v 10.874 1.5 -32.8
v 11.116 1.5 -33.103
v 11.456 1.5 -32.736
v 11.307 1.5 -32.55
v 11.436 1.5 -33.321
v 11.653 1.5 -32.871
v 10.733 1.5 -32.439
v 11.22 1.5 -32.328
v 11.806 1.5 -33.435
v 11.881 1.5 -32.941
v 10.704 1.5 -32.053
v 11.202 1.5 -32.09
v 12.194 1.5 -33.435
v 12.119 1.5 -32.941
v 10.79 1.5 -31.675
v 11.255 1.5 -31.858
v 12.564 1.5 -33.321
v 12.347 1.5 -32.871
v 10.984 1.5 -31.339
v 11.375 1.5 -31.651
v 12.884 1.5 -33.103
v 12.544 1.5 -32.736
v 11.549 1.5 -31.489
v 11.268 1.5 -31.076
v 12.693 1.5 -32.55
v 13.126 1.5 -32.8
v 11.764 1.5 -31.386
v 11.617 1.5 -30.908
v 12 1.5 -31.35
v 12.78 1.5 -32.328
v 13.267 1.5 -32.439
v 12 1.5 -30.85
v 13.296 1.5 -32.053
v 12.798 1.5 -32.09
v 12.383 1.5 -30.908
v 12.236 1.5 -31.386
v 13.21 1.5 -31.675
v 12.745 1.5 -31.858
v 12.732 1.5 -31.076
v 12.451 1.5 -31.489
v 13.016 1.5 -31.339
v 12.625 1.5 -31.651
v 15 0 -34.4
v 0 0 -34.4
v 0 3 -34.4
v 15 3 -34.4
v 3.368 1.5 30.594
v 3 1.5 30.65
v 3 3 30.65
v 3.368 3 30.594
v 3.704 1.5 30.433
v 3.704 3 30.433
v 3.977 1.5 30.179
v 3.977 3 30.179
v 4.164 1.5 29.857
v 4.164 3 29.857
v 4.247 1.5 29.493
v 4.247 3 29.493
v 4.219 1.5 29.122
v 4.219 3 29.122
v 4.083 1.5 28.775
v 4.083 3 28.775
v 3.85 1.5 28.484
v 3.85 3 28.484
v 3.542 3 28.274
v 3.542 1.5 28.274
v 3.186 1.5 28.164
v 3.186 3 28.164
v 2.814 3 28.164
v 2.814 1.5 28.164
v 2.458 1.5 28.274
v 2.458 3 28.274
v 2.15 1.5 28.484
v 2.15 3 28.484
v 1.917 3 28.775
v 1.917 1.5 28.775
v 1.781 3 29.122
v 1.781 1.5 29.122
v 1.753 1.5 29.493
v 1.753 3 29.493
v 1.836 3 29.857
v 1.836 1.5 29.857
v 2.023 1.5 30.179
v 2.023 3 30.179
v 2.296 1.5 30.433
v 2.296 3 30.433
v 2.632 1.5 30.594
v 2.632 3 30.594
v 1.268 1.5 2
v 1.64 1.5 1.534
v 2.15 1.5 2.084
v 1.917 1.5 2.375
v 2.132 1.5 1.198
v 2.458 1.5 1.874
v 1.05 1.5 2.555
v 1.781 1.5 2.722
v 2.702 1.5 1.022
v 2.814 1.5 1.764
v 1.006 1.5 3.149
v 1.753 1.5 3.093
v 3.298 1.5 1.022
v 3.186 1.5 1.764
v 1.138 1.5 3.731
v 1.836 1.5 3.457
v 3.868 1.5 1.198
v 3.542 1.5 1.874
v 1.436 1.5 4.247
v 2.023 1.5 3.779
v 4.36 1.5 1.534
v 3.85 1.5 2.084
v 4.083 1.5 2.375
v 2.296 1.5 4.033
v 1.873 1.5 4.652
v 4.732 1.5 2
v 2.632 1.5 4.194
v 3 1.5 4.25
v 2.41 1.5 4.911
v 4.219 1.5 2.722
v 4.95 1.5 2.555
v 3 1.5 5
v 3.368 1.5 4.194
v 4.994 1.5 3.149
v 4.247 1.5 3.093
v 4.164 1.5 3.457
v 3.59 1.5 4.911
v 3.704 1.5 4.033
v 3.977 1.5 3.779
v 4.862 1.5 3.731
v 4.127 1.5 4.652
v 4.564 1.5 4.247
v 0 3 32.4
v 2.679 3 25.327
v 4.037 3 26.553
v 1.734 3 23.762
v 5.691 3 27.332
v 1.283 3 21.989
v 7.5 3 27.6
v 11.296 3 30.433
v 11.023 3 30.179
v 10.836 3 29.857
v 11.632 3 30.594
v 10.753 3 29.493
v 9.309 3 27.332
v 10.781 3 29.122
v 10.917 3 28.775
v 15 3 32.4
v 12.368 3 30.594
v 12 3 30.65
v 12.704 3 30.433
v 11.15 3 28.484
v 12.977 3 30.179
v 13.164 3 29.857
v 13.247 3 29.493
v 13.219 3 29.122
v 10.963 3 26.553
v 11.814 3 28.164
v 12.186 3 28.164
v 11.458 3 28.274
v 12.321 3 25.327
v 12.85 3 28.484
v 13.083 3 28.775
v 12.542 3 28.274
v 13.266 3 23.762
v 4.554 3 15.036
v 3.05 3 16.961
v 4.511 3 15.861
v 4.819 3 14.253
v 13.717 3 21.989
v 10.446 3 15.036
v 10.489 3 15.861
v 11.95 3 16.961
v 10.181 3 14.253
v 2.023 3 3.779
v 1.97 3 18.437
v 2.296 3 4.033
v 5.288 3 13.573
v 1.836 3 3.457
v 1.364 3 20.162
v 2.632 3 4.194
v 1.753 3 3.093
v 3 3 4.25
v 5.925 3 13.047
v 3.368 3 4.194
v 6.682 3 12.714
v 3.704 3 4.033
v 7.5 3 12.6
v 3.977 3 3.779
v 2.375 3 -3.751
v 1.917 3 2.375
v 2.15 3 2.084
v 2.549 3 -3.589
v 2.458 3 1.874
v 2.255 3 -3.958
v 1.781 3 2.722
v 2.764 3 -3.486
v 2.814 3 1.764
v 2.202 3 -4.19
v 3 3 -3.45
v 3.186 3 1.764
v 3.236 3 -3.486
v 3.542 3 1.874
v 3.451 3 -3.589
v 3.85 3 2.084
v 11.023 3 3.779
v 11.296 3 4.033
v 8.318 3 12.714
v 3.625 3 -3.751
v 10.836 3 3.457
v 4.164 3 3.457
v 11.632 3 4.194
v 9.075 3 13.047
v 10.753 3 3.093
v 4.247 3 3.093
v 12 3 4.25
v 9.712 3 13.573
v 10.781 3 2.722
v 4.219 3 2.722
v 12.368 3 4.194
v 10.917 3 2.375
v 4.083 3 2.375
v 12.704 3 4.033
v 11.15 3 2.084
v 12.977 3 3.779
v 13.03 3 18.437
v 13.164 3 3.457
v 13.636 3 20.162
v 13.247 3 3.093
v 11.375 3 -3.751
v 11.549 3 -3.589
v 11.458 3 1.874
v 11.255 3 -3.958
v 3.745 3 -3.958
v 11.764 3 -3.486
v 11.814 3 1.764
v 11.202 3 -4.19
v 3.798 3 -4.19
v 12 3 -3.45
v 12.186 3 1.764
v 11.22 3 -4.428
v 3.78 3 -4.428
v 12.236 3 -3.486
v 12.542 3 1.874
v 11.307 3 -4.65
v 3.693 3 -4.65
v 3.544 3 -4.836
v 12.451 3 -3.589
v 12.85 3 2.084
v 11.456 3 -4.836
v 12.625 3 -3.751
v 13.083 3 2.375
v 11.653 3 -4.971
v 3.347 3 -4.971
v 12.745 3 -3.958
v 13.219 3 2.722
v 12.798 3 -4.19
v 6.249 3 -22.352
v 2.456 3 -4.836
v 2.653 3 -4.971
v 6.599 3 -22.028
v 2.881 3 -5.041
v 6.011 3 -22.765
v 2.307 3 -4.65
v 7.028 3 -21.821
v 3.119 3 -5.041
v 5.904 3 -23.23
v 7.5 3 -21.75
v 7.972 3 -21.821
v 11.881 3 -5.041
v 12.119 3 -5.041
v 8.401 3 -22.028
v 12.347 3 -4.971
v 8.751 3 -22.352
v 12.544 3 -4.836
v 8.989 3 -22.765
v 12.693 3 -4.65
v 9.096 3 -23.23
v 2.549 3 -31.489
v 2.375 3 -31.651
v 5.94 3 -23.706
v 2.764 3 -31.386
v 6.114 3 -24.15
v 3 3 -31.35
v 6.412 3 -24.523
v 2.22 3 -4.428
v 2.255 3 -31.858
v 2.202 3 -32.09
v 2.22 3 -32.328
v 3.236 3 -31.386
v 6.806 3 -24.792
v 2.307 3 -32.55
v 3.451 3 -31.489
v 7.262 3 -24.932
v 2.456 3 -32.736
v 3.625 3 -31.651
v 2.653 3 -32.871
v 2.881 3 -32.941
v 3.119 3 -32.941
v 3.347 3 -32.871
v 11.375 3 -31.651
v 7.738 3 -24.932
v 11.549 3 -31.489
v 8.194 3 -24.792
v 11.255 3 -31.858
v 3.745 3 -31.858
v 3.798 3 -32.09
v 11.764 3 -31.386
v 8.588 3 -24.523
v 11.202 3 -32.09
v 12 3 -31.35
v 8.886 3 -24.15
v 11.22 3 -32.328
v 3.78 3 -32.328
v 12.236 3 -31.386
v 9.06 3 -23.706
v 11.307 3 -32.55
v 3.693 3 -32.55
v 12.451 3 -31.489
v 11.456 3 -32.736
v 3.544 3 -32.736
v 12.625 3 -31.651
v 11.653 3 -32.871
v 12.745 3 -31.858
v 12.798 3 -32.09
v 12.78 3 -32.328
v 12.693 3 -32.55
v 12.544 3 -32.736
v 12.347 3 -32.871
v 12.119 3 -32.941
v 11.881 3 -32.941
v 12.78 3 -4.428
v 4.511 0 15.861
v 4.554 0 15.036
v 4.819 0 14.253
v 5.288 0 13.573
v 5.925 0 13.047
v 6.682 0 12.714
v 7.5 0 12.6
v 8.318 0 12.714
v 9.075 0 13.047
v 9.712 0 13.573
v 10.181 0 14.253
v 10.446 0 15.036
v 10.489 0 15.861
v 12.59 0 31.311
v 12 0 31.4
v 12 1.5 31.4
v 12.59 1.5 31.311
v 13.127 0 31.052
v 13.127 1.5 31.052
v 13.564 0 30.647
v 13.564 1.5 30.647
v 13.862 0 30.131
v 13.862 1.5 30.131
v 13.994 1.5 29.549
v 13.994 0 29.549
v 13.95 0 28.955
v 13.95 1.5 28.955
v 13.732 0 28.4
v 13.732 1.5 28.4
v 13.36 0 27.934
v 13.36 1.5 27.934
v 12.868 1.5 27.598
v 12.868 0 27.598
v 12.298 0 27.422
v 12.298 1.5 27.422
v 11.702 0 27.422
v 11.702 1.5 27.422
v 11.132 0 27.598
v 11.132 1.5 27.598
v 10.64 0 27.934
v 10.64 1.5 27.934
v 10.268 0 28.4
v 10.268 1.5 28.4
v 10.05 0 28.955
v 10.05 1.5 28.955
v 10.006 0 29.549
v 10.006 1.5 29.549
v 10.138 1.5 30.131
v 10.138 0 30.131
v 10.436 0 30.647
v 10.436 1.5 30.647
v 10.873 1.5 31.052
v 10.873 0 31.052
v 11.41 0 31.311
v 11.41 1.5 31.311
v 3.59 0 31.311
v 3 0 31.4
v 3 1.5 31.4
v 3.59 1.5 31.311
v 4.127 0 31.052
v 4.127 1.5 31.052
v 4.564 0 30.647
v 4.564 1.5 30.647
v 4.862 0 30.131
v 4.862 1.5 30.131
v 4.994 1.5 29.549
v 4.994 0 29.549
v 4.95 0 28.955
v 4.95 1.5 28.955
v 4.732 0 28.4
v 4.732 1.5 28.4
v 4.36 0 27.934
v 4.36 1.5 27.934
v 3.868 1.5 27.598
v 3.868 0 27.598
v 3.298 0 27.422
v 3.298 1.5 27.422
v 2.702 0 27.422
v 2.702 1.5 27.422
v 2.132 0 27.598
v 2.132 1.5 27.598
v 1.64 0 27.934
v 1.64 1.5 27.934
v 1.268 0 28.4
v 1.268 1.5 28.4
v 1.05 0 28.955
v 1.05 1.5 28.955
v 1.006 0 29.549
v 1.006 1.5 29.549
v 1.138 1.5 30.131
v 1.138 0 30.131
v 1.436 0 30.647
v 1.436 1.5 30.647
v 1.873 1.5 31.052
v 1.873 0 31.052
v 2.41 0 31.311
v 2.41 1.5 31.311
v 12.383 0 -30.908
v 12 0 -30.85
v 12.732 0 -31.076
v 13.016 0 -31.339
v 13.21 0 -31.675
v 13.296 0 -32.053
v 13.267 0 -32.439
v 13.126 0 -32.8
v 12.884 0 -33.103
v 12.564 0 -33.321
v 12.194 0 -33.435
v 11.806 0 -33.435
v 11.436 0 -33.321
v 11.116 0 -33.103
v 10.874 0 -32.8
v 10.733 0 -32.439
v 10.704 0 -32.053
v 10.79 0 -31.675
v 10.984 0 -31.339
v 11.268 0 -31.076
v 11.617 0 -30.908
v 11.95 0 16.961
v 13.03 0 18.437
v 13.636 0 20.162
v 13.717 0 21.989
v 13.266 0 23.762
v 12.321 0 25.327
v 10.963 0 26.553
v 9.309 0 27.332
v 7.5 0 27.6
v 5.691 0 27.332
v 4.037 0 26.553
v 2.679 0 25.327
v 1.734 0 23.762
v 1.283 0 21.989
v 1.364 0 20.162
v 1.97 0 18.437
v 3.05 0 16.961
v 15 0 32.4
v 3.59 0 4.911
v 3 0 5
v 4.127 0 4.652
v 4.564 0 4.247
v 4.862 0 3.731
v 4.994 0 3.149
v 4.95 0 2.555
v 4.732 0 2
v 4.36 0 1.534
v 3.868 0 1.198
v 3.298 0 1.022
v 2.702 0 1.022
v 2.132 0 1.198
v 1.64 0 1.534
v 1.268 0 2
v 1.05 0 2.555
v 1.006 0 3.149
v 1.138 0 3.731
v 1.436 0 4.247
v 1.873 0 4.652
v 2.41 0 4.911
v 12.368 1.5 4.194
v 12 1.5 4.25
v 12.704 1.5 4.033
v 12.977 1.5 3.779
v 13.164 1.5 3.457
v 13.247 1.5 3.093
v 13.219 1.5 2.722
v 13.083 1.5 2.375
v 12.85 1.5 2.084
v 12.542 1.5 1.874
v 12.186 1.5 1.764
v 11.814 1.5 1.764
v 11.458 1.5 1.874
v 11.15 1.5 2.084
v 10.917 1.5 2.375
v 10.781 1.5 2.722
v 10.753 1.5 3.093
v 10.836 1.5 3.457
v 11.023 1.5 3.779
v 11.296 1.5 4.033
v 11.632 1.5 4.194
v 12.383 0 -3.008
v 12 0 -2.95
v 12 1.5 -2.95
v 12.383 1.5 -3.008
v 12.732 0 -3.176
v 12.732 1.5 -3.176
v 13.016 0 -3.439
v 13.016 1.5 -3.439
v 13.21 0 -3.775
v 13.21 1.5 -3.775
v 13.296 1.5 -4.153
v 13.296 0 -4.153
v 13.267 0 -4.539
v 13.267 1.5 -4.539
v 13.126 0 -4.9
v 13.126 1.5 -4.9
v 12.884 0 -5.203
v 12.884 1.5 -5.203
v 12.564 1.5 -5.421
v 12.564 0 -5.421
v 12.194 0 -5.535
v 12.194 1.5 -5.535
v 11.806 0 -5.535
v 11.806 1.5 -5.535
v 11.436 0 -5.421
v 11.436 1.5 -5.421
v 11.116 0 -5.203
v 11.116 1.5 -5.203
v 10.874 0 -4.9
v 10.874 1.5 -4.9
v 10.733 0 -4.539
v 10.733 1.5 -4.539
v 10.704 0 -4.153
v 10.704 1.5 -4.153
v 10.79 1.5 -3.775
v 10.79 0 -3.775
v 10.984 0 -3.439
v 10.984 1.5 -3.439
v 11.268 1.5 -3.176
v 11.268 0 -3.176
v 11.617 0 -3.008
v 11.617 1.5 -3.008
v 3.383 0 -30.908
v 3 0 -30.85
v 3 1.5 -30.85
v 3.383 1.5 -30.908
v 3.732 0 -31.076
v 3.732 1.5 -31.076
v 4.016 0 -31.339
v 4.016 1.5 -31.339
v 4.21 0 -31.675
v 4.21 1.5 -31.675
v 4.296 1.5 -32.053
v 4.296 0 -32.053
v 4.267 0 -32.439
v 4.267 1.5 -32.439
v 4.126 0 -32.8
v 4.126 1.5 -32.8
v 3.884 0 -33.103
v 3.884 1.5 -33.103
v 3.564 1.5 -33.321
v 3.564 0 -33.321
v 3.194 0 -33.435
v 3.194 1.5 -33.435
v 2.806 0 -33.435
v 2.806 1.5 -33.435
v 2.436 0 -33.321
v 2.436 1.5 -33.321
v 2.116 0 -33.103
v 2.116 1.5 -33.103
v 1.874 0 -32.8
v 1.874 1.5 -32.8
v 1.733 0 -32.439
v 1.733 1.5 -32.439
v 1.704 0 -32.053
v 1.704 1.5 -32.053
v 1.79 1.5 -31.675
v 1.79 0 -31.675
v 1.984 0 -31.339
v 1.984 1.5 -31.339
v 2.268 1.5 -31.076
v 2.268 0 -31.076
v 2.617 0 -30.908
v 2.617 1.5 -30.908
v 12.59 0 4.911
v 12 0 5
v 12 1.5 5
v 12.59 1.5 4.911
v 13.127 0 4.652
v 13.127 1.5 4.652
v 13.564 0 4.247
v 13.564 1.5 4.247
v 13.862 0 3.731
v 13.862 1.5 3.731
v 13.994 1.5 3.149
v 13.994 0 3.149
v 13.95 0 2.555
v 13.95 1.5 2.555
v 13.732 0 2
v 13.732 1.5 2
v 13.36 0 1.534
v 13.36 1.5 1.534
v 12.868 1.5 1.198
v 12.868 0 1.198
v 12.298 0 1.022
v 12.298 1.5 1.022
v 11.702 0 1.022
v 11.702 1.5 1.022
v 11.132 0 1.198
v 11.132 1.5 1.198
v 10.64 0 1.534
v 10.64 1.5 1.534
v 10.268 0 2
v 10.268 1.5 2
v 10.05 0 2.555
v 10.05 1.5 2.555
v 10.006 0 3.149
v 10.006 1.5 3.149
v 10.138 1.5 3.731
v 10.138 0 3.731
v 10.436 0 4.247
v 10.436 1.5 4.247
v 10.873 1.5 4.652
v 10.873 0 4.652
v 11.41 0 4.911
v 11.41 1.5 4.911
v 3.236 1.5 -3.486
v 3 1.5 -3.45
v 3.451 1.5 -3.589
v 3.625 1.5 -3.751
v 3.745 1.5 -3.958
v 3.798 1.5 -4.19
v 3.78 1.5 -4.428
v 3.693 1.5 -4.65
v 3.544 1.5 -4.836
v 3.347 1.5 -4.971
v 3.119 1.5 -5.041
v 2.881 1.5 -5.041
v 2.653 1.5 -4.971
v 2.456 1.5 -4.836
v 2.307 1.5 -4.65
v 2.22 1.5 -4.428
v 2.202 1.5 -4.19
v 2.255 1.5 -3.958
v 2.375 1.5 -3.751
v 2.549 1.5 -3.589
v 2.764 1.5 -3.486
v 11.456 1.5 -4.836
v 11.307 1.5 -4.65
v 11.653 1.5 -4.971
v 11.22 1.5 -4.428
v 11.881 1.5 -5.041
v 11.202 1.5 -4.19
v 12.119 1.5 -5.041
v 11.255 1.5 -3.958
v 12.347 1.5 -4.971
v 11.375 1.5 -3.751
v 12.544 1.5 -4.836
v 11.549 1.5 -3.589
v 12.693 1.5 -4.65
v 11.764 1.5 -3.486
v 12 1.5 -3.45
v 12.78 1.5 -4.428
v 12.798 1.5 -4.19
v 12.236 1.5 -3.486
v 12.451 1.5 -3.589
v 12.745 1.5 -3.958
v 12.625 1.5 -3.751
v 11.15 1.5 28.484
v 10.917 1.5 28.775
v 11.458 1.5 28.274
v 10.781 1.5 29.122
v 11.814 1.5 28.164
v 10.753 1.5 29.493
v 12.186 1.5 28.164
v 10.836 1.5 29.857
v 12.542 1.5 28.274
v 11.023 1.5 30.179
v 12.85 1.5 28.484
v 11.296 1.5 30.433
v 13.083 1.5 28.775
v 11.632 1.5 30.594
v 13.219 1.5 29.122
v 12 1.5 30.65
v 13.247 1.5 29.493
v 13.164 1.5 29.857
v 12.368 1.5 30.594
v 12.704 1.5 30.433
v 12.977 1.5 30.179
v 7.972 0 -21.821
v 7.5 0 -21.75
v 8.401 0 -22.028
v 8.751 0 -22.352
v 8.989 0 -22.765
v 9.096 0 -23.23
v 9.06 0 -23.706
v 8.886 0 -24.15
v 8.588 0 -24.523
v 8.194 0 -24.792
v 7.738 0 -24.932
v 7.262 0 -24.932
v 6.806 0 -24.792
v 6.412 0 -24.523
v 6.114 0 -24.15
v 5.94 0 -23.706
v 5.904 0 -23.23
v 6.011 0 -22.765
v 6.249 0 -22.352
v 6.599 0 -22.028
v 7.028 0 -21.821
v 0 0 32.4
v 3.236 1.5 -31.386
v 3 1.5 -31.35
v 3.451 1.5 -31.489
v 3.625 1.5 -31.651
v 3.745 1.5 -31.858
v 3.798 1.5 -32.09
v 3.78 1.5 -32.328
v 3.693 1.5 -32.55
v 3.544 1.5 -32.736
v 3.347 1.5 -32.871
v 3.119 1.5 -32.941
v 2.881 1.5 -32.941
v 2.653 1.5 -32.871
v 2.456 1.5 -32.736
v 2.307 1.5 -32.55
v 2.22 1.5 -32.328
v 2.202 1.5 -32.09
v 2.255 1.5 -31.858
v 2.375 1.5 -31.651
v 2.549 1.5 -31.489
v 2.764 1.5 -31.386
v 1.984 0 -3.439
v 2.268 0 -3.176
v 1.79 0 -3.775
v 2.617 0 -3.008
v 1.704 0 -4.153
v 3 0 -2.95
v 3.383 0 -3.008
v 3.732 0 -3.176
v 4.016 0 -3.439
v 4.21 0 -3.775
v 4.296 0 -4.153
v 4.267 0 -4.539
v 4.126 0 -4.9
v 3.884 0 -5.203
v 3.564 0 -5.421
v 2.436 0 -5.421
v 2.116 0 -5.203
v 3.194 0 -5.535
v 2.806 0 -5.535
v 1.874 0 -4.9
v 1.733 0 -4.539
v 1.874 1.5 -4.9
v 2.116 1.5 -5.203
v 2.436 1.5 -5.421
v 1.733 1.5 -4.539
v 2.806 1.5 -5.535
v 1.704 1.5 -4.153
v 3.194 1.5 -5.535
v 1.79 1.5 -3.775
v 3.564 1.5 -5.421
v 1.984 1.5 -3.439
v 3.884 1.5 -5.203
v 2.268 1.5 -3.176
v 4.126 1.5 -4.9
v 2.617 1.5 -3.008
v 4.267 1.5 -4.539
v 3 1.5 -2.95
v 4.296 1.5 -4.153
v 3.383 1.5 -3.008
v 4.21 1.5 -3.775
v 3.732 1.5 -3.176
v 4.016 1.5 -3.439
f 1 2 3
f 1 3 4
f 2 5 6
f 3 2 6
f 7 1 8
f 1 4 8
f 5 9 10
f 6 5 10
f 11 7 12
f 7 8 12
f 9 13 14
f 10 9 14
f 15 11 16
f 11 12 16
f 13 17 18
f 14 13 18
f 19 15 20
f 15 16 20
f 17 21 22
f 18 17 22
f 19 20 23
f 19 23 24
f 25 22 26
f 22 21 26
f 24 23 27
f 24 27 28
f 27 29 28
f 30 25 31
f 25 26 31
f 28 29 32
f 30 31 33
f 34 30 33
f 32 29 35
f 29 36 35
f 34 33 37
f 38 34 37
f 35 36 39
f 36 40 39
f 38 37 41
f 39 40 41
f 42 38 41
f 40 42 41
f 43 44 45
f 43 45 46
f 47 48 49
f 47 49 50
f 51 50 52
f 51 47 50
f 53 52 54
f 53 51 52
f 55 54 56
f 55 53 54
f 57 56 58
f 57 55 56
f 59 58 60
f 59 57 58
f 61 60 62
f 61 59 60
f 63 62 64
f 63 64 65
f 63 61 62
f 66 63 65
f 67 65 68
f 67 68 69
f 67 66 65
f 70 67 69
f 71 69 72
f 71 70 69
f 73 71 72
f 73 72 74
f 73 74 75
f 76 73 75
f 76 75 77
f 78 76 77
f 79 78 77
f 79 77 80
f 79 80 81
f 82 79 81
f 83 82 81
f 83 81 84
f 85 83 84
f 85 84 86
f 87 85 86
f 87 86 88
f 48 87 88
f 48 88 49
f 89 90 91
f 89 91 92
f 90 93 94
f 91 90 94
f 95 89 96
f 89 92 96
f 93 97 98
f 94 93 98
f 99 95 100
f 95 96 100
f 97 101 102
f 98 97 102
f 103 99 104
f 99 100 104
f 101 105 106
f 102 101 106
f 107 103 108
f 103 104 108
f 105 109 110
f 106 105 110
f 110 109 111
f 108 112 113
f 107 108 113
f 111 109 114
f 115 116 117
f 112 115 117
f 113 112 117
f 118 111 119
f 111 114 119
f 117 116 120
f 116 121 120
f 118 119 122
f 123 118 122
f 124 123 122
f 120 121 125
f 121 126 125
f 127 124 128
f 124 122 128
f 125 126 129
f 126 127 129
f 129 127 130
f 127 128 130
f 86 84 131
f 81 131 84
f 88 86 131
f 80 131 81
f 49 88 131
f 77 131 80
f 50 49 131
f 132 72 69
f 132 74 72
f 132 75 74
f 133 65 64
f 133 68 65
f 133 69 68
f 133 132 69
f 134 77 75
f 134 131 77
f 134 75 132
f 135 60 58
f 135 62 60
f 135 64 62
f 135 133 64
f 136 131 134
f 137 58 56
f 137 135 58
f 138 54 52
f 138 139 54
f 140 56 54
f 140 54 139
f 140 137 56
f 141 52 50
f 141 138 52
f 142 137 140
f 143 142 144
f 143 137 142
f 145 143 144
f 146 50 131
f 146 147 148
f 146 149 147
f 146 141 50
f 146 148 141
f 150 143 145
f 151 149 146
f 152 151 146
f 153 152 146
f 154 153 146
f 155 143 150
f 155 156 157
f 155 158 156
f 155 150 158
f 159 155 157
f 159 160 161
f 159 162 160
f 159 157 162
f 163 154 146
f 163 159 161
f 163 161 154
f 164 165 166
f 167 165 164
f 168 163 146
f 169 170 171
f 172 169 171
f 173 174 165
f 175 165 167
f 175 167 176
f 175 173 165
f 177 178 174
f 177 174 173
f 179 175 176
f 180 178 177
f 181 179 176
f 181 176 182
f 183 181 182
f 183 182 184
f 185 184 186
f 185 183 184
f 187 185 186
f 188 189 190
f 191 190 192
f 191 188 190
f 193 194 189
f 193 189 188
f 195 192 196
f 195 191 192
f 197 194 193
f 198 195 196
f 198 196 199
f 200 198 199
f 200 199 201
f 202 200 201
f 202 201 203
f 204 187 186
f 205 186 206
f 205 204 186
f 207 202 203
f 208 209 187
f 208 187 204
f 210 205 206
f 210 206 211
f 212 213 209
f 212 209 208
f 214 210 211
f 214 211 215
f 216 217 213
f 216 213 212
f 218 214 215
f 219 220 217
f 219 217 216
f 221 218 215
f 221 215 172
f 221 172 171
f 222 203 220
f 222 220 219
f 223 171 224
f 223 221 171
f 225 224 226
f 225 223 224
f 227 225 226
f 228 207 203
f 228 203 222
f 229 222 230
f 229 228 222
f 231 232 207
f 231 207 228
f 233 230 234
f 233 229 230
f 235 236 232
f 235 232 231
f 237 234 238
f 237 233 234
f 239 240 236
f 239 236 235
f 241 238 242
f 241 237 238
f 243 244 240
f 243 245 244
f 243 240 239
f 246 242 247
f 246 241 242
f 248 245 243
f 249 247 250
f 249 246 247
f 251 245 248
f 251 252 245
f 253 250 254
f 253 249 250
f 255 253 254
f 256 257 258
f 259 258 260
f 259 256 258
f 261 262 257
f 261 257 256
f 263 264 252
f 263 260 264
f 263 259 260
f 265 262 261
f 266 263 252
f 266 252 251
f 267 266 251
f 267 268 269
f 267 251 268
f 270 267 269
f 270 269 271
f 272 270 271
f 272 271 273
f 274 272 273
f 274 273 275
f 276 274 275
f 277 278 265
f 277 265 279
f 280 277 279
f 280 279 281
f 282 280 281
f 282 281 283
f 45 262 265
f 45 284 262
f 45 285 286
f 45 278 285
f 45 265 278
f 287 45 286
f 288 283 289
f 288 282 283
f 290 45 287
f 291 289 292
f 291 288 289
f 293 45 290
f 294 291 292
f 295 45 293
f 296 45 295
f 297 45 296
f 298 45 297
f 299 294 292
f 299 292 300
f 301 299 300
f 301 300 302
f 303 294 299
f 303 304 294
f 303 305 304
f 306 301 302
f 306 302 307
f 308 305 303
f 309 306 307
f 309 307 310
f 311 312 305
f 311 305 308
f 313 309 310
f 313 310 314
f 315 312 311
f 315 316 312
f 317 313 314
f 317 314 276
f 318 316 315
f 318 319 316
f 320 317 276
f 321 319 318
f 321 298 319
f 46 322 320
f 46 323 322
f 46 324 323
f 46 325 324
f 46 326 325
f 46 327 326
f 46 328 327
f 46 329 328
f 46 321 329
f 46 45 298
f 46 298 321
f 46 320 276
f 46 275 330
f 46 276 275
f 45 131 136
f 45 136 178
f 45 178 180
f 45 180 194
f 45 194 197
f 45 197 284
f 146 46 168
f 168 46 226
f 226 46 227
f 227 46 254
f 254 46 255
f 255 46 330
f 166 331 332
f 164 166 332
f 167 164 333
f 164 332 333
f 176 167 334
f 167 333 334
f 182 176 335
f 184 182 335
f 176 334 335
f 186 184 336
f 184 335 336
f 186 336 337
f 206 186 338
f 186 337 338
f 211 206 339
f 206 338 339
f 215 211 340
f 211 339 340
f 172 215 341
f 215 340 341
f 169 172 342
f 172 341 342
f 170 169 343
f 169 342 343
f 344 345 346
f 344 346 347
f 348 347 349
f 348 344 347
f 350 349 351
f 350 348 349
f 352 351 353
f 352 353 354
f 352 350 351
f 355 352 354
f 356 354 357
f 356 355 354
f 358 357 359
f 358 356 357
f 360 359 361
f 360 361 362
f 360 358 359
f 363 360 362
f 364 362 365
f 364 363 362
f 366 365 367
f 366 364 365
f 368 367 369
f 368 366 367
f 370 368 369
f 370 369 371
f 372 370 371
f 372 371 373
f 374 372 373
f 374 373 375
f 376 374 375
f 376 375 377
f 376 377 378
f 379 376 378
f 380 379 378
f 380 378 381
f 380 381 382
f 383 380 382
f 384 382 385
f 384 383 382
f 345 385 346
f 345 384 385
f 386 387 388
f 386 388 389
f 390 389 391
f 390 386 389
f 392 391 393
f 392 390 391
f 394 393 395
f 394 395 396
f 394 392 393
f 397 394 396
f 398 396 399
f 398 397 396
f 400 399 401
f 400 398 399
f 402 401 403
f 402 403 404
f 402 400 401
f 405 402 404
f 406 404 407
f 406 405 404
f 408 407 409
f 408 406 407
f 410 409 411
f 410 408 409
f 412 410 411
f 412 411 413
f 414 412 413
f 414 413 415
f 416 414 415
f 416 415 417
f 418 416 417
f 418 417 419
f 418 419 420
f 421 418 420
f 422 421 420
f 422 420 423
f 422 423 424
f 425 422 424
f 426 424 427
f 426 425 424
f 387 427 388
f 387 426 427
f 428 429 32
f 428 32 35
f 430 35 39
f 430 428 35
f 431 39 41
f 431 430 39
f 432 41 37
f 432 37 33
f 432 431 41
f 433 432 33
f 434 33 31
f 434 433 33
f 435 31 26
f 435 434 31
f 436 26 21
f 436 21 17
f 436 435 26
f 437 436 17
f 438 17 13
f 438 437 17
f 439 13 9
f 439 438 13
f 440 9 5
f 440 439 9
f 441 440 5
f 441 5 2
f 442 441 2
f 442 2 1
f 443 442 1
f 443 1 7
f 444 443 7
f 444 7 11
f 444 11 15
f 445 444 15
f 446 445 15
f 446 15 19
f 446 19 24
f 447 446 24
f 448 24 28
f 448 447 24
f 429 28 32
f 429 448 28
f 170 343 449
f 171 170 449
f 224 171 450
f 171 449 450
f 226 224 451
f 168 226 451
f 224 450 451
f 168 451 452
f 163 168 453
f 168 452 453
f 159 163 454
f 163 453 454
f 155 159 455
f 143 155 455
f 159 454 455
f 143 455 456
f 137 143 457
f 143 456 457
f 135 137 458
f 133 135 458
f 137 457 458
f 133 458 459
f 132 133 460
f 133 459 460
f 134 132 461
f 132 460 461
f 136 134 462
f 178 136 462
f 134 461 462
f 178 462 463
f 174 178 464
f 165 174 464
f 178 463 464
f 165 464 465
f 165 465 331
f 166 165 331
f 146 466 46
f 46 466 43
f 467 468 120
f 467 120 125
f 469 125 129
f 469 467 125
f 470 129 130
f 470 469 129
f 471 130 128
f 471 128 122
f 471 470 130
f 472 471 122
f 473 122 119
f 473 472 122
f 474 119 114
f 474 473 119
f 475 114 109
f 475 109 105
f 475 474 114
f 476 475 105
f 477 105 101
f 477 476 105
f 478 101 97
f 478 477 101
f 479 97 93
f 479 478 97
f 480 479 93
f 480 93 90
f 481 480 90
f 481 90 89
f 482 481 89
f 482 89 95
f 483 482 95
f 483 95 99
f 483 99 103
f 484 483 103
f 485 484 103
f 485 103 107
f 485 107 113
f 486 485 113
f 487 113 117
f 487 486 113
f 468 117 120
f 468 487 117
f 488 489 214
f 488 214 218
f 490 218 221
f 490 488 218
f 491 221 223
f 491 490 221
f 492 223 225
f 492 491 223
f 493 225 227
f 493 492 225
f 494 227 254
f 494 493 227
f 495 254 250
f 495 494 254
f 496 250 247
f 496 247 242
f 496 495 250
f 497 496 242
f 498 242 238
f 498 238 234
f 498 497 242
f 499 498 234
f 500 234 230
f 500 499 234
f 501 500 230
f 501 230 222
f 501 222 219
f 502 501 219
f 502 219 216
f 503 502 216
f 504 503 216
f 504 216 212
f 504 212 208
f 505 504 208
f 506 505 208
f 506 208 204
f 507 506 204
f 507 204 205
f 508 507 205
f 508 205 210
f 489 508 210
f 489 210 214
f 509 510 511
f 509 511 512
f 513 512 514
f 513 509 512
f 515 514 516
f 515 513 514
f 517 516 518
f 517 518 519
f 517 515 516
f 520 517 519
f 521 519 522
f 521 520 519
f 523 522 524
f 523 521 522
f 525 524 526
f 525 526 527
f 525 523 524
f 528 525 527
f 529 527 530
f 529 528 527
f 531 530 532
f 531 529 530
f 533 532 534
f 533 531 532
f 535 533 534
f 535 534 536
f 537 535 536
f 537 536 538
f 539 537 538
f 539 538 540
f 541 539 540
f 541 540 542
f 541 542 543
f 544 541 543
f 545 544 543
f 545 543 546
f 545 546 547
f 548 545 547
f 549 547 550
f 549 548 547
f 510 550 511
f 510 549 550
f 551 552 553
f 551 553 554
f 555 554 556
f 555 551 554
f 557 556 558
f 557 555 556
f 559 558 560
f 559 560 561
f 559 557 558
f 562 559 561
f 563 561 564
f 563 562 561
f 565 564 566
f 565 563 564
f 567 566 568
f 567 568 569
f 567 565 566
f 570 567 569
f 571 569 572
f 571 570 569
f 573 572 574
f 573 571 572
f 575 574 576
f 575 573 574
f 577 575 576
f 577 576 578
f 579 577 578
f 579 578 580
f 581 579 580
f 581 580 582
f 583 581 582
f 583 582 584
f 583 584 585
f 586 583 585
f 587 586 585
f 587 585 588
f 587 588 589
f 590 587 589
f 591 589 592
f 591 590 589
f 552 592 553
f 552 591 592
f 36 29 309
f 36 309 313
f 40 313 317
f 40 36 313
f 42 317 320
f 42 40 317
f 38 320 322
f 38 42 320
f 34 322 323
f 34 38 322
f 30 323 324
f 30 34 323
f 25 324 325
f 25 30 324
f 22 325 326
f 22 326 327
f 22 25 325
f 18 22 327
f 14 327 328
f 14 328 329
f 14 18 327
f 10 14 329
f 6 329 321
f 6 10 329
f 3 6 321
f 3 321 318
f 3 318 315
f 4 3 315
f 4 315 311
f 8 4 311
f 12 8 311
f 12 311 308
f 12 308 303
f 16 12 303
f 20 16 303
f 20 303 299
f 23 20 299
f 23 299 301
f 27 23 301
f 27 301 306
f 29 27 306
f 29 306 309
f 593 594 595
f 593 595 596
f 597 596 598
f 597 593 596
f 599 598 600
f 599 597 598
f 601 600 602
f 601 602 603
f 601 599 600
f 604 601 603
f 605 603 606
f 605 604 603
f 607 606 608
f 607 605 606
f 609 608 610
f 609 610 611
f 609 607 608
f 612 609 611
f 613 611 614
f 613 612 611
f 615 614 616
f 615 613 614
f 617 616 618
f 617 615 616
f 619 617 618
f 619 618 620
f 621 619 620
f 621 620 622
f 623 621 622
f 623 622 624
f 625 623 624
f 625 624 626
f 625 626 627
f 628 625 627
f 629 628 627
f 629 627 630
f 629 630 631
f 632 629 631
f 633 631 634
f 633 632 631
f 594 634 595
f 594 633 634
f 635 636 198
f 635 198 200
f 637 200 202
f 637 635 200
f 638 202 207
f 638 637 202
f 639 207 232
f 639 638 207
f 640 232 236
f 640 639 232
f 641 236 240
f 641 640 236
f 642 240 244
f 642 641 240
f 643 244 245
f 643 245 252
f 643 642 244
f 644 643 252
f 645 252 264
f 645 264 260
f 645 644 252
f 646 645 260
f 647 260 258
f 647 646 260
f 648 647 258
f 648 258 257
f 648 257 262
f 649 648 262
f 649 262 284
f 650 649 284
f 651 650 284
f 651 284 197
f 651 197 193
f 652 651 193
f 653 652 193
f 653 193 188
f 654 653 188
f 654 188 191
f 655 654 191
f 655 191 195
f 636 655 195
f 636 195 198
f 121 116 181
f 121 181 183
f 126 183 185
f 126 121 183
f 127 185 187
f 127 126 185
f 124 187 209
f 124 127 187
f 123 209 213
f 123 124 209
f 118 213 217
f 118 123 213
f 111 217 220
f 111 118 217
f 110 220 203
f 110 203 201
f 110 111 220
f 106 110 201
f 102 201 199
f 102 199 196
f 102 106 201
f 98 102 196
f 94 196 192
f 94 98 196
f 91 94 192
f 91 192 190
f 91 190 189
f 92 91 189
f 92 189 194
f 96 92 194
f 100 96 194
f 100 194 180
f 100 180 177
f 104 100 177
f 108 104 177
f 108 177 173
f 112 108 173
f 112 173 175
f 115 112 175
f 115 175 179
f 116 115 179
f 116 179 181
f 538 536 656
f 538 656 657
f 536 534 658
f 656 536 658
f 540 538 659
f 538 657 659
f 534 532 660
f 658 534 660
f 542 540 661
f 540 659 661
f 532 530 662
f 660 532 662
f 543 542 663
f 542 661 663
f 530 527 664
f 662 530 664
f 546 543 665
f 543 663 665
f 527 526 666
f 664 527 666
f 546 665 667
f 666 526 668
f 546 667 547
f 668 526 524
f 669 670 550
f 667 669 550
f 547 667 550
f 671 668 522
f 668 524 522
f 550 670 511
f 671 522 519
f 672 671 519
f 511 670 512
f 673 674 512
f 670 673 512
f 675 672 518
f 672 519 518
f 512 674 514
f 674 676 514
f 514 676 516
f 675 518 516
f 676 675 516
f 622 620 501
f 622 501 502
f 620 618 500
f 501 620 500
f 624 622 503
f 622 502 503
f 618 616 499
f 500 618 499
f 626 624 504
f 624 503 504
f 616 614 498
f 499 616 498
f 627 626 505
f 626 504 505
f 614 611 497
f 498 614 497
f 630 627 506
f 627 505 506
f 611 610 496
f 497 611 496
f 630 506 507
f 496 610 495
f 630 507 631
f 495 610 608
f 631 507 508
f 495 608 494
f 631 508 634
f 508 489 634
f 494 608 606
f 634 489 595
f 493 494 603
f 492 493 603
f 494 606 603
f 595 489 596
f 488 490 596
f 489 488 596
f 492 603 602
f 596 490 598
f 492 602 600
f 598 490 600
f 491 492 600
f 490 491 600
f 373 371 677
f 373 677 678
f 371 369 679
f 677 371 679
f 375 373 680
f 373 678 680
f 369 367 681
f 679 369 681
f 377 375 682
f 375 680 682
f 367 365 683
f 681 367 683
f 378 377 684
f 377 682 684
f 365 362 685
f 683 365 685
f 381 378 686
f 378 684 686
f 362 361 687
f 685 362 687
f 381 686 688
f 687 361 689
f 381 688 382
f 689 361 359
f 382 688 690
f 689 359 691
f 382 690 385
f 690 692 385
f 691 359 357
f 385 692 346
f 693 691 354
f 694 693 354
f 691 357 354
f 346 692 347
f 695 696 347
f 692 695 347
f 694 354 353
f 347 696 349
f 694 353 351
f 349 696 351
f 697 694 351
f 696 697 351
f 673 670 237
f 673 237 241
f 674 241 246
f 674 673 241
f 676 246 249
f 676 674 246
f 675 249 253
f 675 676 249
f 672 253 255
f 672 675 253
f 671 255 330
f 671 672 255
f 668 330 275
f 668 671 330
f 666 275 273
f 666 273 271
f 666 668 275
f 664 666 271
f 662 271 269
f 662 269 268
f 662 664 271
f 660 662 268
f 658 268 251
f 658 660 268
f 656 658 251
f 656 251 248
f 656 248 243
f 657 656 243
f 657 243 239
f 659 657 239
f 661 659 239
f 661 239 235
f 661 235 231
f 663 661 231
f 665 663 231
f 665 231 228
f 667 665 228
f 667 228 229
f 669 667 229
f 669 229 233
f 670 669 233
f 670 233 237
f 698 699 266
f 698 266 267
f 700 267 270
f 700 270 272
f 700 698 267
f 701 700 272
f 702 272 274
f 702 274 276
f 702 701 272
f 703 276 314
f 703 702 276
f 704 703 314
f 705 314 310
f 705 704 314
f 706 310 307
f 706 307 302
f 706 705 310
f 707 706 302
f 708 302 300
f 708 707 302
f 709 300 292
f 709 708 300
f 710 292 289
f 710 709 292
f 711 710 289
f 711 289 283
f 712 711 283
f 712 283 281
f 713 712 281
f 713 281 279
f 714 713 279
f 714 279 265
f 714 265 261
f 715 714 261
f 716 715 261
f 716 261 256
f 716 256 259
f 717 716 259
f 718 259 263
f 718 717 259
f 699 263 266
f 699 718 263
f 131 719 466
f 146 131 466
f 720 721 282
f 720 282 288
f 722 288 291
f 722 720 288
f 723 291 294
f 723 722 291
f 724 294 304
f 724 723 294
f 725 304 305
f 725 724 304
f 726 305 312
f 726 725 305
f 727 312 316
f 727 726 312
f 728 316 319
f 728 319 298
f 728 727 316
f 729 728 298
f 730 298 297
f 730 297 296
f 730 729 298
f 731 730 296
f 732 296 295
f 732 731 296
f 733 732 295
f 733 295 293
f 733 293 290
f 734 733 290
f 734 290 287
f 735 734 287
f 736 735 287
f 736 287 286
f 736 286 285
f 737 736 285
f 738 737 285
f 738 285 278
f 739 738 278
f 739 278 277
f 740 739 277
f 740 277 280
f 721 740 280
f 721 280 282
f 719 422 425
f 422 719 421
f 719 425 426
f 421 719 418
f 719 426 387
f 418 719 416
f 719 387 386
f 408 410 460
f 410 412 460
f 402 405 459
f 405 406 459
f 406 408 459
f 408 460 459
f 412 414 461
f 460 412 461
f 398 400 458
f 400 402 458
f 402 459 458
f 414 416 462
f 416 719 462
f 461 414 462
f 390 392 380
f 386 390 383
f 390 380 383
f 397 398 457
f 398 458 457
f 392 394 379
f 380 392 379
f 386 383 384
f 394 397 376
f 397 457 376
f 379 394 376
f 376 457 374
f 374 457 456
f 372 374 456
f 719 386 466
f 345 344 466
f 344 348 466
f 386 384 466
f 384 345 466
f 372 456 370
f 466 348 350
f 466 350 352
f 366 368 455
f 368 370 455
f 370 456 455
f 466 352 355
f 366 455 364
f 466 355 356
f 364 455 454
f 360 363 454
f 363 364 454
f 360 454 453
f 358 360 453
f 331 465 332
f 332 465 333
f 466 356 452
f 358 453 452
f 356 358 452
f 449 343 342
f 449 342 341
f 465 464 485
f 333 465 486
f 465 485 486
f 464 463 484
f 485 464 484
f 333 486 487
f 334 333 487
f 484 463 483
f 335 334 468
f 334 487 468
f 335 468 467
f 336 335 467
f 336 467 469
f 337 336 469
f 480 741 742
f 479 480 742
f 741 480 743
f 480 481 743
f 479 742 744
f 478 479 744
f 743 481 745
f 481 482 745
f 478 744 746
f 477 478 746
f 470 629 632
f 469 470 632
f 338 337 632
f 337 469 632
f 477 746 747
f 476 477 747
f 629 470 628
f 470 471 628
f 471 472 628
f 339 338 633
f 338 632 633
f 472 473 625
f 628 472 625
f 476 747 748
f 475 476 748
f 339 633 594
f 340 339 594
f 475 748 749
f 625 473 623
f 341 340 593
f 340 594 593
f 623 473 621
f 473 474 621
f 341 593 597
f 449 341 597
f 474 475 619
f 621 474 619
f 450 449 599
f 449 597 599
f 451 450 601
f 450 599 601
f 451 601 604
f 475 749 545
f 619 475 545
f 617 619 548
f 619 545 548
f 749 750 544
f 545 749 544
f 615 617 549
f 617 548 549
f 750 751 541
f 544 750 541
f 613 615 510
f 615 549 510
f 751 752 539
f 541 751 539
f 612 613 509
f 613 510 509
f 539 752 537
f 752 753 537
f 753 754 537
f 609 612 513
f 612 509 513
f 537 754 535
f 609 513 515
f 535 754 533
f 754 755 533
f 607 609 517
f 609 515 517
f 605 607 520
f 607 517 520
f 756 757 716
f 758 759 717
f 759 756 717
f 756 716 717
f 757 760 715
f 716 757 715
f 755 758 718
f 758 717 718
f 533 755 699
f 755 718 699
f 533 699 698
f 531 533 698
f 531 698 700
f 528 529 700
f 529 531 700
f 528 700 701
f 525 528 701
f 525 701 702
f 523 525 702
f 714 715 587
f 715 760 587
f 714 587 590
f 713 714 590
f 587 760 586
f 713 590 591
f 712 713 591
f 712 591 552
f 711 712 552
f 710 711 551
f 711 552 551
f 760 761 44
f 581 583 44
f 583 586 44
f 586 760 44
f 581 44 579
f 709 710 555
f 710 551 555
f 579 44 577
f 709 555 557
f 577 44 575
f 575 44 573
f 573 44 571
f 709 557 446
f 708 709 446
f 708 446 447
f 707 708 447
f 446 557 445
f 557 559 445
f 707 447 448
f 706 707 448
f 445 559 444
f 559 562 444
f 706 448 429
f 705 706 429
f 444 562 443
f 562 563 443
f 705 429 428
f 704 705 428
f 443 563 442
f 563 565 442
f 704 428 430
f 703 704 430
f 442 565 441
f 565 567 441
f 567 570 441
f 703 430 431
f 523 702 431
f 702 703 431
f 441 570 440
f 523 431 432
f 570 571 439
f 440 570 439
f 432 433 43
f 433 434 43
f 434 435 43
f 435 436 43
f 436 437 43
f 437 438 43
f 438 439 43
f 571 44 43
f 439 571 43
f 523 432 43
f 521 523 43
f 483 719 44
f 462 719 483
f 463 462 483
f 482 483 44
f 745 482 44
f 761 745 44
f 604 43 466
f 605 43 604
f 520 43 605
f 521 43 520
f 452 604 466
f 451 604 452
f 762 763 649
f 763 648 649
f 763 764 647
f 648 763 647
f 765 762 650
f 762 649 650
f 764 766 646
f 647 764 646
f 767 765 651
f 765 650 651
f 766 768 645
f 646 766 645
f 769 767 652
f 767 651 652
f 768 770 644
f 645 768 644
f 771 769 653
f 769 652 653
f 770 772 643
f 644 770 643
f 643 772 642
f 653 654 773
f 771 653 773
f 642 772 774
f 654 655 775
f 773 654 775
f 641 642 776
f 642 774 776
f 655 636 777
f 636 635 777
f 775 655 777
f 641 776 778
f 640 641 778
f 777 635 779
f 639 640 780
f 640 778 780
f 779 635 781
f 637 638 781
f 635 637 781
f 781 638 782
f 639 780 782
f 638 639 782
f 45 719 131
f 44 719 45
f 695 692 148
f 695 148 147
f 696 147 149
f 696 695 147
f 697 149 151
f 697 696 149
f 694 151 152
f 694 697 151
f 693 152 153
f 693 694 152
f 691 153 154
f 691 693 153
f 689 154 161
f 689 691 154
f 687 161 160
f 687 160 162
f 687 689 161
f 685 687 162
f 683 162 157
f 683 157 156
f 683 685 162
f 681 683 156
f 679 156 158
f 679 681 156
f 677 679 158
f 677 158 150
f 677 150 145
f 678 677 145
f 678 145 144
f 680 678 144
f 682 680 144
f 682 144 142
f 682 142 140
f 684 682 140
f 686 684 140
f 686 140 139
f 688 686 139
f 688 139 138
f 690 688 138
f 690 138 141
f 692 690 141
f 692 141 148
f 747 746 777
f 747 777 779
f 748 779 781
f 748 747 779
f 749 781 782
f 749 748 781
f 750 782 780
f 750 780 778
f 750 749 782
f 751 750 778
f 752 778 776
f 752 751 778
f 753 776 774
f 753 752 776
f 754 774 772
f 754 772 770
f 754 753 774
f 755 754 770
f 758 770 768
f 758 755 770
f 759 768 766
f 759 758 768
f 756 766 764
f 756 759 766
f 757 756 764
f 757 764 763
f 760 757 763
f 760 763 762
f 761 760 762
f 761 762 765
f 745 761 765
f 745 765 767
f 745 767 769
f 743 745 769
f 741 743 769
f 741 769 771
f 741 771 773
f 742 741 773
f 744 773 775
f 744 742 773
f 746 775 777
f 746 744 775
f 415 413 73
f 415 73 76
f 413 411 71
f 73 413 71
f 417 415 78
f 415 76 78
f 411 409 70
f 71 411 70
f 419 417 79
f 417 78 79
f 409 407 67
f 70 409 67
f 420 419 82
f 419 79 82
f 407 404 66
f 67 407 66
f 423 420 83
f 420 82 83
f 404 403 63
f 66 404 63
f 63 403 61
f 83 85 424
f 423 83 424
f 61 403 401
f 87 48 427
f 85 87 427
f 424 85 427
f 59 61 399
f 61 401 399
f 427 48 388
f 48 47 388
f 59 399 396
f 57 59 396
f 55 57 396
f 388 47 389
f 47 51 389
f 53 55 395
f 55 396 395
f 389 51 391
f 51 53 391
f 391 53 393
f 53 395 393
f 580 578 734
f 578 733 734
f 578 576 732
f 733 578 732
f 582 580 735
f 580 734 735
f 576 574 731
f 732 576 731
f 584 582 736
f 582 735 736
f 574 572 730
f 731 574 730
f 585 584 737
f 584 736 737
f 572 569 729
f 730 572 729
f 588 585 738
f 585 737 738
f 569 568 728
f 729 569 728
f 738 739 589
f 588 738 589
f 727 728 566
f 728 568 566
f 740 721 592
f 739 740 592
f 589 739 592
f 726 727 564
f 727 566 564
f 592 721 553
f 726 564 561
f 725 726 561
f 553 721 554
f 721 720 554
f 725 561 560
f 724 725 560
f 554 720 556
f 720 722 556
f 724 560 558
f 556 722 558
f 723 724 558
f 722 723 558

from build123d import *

# Parameters (mm, degrees)
SKETCH_1_W          = 15
SKETCH_1_H          = 66.8
SKETCH_1_R          = 1.6
SKETCH_1_R_2        = 0.8
SKETCH_1_R_3        = 1.25
EXTRUDE_1_DEPTH     = 3
SKETCH_1_5_R        = 2
SKETCH_1_5_R_2      = 1.3
CUT_EXTRUDE_3_DEPTH = 1.5


with BuildPart() as part:
    # 草图1 → 凸台-拉伸1 (new body)
    with BuildSketch(Plane(origin=(0, 0, 0), x_dir=(1, 0, 0), z_dir=(0, 1, 0))):
        with Locations((7.5, 1)):
            Rectangle(SKETCH_1_W, SKETCH_1_H)
        with Locations((7.5, 23.35)):
            Circle(SKETCH_1_R, mode=Mode.SUBTRACT)
        with BuildLine():
            ThreePointArc((10.488636323, -15.860869565), (7.5, -27.6), (4.511363677, -15.860869565))
            ThreePointArc((4.511363677, -15.860869565), (7.5, -12.6), (10.488636323, -15.860869565))
        make_face(mode=Mode.SUBTRACT)
        with Locations((12, 32.15)):
            Circle(SKETCH_1_R_2, mode=Mode.SUBTRACT)
        with Locations((3, 4.25)):
            Circle(SKETCH_1_R_2, mode=Mode.SUBTRACT)
        with Locations((3, 32.15)):
            Circle(SKETCH_1_R_2, mode=Mode.SUBTRACT)
        with Locations((12, 4.25)):
            Circle(SKETCH_1_R_2, mode=Mode.SUBTRACT)
        with Locations((12, -3)):
            Circle(SKETCH_1_R_3, mode=Mode.SUBTRACT)
        with Locations((3, -29.4)):
            Circle(SKETCH_1_R_3, mode=Mode.SUBTRACT)
        with Locations((3, -3)):
            Circle(SKETCH_1_R_3, mode=Mode.SUBTRACT)
        with Locations((12, -29.4)):
            Circle(SKETCH_1_R_3, mode=Mode.SUBTRACT)
    extrude(amount=EXTRUDE_1_DEPTH)

    # 草图1<5> → 切除-拉伸3 (cut)
    with BuildSketch(Plane(origin=(0, 0, 0), x_dir=(1, 0, 0), z_dir=(0, 1, 0))):
        with Locations((3, -3)):
            Circle(SKETCH_1_5_R)
        with Locations((12, -3)):
            Circle(SKETCH_1_5_R)
        with Locations((3, -29.4)):
            Circle(SKETCH_1_5_R)
        with Locations((12, -29.4)):
            Circle(SKETCH_1_5_R)
        with Locations((3, 4.25)):
            Circle(SKETCH_1_5_R_2)
        with Locations((12, 4.25)):
            Circle(SKETCH_1_5_R_2)
        with Locations((3, 32.15)):
            Circle(SKETCH_1_5_R_2)
        with Locations((12, 32.15)):
            Circle(SKETCH_1_5_R_2)
    extrude(amount=CUT_EXTRUDE_3_DEPTH, mode=Mode.SUBTRACT)


solid = part.part
